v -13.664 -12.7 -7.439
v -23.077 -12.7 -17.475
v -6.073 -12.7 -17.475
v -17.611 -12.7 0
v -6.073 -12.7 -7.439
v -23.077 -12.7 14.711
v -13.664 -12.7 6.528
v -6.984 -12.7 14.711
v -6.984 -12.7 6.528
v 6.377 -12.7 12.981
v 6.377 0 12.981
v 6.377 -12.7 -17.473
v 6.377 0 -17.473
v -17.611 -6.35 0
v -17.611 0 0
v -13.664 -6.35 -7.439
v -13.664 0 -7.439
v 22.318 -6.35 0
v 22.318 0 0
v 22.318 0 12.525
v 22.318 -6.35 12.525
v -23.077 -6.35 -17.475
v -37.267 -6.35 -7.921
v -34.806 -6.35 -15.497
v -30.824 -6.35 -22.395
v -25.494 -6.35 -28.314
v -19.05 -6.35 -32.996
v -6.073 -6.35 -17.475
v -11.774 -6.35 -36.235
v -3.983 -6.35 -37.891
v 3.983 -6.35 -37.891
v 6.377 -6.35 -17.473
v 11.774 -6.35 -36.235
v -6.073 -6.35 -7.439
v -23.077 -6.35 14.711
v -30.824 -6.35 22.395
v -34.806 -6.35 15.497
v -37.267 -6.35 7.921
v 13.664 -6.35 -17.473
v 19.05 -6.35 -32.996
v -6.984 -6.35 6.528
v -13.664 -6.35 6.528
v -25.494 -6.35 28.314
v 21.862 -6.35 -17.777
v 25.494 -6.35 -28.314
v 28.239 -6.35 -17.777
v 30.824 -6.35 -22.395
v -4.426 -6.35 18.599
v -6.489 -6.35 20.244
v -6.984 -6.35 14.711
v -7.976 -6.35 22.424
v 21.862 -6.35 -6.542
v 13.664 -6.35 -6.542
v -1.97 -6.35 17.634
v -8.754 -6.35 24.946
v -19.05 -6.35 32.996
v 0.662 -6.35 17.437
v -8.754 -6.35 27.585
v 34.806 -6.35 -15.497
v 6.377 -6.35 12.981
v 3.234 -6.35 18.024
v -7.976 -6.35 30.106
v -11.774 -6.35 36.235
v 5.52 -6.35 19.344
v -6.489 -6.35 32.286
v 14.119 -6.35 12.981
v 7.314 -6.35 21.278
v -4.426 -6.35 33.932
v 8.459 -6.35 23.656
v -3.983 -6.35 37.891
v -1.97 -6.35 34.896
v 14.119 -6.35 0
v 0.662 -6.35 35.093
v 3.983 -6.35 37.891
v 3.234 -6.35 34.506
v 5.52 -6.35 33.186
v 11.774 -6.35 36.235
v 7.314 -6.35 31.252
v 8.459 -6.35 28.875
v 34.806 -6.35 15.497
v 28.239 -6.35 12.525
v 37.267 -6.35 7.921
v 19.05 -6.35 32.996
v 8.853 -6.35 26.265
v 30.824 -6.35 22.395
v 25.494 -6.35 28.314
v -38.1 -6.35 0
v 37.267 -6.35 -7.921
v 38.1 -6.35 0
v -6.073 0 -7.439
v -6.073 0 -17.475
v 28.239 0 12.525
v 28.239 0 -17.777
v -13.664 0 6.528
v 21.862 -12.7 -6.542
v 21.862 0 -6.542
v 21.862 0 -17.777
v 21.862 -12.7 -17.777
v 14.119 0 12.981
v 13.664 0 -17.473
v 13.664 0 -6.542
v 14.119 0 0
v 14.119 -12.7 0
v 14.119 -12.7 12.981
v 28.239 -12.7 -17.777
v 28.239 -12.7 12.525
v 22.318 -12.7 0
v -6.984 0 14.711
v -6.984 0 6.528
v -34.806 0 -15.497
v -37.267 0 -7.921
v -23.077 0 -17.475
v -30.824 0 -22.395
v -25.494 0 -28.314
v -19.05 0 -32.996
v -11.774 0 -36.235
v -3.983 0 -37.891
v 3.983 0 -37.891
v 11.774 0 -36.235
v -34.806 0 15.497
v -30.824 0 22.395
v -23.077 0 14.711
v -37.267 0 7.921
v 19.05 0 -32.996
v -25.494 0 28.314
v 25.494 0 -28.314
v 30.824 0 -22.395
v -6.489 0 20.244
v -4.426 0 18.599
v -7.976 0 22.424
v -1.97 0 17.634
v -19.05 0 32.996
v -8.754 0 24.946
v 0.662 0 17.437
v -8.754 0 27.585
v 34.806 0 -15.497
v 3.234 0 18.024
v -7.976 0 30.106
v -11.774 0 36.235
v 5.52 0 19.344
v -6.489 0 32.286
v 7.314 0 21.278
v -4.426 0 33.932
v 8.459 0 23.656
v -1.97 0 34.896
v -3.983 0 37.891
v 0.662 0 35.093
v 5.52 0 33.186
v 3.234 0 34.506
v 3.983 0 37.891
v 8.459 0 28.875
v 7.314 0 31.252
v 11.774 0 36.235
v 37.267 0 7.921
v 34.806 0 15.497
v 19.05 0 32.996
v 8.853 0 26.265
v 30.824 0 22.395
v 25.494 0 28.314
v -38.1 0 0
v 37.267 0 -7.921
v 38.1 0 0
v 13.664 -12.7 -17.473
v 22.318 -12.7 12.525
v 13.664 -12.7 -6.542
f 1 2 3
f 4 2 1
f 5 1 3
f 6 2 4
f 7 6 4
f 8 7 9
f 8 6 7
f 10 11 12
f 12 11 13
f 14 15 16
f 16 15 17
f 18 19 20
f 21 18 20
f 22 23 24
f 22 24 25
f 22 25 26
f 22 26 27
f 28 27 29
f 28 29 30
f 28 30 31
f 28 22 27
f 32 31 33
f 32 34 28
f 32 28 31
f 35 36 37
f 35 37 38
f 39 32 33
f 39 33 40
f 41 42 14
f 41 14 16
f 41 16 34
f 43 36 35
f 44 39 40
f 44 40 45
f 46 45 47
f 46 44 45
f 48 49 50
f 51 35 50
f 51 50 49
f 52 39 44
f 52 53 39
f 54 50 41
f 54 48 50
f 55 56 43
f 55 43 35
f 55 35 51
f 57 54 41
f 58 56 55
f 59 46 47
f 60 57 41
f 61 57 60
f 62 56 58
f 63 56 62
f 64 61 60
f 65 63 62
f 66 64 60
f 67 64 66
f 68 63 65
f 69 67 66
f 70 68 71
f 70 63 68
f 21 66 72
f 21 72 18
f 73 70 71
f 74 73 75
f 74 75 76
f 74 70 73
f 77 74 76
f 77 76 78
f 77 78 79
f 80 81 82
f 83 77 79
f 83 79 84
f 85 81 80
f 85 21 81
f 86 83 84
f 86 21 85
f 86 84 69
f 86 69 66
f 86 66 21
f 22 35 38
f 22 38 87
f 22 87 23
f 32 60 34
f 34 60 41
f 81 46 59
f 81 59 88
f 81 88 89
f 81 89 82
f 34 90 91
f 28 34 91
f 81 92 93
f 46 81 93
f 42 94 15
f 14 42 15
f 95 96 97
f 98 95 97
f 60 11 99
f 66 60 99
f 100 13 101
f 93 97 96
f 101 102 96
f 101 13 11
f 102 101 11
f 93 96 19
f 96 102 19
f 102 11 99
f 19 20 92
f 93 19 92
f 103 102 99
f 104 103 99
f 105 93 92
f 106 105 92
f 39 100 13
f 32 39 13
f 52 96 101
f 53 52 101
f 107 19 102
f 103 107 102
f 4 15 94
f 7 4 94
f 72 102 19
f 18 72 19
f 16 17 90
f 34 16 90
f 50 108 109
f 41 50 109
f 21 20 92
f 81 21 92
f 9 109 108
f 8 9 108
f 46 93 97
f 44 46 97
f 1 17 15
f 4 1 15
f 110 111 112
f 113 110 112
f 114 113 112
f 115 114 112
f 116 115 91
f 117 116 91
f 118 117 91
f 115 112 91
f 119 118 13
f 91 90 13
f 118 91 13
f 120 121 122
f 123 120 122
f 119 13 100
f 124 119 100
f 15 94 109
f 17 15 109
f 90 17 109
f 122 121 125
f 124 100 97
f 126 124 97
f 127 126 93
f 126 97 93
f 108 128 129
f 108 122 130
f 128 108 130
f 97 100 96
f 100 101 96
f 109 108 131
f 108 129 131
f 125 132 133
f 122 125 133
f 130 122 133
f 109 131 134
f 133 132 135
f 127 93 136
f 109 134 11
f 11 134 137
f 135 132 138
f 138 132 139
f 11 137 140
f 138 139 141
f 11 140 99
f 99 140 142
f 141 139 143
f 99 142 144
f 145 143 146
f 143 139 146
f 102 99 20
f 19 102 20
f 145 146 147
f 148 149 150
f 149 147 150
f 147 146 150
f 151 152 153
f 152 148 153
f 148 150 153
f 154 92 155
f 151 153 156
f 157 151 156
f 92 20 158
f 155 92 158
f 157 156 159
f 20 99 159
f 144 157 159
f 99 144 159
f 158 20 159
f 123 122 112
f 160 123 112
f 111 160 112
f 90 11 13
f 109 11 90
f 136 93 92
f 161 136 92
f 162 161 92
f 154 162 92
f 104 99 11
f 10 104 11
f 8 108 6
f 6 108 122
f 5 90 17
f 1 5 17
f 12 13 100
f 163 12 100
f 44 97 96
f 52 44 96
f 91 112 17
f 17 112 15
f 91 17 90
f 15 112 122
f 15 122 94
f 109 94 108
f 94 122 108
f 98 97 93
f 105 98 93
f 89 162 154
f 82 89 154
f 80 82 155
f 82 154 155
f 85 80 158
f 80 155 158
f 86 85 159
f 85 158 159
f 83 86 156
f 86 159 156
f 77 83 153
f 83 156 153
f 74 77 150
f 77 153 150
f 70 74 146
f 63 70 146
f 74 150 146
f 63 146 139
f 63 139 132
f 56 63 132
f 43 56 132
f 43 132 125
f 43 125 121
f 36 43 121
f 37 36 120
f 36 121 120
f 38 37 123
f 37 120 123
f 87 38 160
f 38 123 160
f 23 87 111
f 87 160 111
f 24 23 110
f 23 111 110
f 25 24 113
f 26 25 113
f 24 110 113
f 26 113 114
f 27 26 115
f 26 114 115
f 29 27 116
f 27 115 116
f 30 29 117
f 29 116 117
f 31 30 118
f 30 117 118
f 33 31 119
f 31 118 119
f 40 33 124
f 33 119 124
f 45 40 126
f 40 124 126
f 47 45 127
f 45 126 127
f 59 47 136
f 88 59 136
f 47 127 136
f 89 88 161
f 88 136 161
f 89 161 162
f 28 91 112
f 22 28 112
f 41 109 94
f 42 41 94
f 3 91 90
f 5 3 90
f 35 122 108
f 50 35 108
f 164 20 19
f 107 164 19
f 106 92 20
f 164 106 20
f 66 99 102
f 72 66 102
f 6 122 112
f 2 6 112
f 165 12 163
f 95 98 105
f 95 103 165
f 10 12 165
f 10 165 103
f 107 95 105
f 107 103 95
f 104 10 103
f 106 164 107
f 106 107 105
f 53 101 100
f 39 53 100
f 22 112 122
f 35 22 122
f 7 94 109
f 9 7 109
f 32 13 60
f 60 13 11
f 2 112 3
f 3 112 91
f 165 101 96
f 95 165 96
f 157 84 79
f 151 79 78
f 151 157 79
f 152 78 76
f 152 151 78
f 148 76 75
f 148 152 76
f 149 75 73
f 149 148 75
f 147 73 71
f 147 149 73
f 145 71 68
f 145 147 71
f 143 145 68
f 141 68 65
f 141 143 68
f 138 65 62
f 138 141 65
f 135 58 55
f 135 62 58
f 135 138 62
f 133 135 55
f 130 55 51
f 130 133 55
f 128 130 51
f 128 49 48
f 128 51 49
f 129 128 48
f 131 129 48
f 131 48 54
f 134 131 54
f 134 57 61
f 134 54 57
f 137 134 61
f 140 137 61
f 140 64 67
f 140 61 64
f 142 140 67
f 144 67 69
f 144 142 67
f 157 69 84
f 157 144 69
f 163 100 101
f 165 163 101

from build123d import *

# Parameters (mm, degrees)
F1_DEPTH = 12.7
F0_R     = 38.1
F2_DEPTH = 6.35
F3_R     = 8.852647
F4_DEPTH = 25.4


with BuildPart() as f1:
    # F0 (on Front) → F1 (new body)
    with BuildSketch(Plane.XZ):
        Polygon((-6.983795, 6.528331), (-6.983795, 14.710986), (-23.076888, 14.710986), (-23.076888, -17.4752), (-6.072866, -17.4752), (-6.072866, -7.43926), (-13.663946, -7.43926), (-17.61131, 0), (-13.663946, 6.528331), align=None)
        Polygon((14.119415, 12.98075), (6.376504, 12.98075), (6.376504, -17.473115), (13.663941, -17.473115), (13.663941, -6.541958), (21.862306, -6.541958), (21.862306, -17.776759), (28.238813, -17.776759), (28.238813, 12.525285), (22.317781, 12.525285), (22.317781, 0), (14.119415, 0), align=None)
    extrude(amount=F1_DEPTH)


with BuildPart() as f2:
    # F0 (on Front) → F2 (new body)
    with BuildSketch(Plane.XZ):
        Circle(F0_R)
        Polygon((-23.076888, 14.710986), (-6.983795, 14.710986), (-6.983795, 6.528331), (-13.663946, 6.528331), (-17.61131, 0), (-13.663946, -7.43926), (-6.072866, -7.43926), (-6.072866, -17.4752), (-23.076888, -17.4752), align=None, mode=Mode.SUBTRACT)
        Polygon((6.376504, -17.473115), (6.376504, 12.98075), (14.119415, 12.98075), (14.119415, 0), (22.317781, 0), (22.317781, 12.525285), (28.238813, 12.525285), (28.238813, -17.776759), (21.862306, -17.776759), (21.862306, -6.541958), (13.663941, -6.541958), (13.663941, -17.473115), align=None, mode=Mode.SUBTRACT)
    extrude(amount=F2_DEPTH)

    # F3 (on Front) → F4 (cut)
    with BuildSketch(Plane.XZ):
        with Locations((0, 26.265142)):
            Circle(F3_R)
    extrude(amount=F4_DEPTH, mode=Mode.SUBTRACT)


solid = Compound([f1.part, f2.part])
